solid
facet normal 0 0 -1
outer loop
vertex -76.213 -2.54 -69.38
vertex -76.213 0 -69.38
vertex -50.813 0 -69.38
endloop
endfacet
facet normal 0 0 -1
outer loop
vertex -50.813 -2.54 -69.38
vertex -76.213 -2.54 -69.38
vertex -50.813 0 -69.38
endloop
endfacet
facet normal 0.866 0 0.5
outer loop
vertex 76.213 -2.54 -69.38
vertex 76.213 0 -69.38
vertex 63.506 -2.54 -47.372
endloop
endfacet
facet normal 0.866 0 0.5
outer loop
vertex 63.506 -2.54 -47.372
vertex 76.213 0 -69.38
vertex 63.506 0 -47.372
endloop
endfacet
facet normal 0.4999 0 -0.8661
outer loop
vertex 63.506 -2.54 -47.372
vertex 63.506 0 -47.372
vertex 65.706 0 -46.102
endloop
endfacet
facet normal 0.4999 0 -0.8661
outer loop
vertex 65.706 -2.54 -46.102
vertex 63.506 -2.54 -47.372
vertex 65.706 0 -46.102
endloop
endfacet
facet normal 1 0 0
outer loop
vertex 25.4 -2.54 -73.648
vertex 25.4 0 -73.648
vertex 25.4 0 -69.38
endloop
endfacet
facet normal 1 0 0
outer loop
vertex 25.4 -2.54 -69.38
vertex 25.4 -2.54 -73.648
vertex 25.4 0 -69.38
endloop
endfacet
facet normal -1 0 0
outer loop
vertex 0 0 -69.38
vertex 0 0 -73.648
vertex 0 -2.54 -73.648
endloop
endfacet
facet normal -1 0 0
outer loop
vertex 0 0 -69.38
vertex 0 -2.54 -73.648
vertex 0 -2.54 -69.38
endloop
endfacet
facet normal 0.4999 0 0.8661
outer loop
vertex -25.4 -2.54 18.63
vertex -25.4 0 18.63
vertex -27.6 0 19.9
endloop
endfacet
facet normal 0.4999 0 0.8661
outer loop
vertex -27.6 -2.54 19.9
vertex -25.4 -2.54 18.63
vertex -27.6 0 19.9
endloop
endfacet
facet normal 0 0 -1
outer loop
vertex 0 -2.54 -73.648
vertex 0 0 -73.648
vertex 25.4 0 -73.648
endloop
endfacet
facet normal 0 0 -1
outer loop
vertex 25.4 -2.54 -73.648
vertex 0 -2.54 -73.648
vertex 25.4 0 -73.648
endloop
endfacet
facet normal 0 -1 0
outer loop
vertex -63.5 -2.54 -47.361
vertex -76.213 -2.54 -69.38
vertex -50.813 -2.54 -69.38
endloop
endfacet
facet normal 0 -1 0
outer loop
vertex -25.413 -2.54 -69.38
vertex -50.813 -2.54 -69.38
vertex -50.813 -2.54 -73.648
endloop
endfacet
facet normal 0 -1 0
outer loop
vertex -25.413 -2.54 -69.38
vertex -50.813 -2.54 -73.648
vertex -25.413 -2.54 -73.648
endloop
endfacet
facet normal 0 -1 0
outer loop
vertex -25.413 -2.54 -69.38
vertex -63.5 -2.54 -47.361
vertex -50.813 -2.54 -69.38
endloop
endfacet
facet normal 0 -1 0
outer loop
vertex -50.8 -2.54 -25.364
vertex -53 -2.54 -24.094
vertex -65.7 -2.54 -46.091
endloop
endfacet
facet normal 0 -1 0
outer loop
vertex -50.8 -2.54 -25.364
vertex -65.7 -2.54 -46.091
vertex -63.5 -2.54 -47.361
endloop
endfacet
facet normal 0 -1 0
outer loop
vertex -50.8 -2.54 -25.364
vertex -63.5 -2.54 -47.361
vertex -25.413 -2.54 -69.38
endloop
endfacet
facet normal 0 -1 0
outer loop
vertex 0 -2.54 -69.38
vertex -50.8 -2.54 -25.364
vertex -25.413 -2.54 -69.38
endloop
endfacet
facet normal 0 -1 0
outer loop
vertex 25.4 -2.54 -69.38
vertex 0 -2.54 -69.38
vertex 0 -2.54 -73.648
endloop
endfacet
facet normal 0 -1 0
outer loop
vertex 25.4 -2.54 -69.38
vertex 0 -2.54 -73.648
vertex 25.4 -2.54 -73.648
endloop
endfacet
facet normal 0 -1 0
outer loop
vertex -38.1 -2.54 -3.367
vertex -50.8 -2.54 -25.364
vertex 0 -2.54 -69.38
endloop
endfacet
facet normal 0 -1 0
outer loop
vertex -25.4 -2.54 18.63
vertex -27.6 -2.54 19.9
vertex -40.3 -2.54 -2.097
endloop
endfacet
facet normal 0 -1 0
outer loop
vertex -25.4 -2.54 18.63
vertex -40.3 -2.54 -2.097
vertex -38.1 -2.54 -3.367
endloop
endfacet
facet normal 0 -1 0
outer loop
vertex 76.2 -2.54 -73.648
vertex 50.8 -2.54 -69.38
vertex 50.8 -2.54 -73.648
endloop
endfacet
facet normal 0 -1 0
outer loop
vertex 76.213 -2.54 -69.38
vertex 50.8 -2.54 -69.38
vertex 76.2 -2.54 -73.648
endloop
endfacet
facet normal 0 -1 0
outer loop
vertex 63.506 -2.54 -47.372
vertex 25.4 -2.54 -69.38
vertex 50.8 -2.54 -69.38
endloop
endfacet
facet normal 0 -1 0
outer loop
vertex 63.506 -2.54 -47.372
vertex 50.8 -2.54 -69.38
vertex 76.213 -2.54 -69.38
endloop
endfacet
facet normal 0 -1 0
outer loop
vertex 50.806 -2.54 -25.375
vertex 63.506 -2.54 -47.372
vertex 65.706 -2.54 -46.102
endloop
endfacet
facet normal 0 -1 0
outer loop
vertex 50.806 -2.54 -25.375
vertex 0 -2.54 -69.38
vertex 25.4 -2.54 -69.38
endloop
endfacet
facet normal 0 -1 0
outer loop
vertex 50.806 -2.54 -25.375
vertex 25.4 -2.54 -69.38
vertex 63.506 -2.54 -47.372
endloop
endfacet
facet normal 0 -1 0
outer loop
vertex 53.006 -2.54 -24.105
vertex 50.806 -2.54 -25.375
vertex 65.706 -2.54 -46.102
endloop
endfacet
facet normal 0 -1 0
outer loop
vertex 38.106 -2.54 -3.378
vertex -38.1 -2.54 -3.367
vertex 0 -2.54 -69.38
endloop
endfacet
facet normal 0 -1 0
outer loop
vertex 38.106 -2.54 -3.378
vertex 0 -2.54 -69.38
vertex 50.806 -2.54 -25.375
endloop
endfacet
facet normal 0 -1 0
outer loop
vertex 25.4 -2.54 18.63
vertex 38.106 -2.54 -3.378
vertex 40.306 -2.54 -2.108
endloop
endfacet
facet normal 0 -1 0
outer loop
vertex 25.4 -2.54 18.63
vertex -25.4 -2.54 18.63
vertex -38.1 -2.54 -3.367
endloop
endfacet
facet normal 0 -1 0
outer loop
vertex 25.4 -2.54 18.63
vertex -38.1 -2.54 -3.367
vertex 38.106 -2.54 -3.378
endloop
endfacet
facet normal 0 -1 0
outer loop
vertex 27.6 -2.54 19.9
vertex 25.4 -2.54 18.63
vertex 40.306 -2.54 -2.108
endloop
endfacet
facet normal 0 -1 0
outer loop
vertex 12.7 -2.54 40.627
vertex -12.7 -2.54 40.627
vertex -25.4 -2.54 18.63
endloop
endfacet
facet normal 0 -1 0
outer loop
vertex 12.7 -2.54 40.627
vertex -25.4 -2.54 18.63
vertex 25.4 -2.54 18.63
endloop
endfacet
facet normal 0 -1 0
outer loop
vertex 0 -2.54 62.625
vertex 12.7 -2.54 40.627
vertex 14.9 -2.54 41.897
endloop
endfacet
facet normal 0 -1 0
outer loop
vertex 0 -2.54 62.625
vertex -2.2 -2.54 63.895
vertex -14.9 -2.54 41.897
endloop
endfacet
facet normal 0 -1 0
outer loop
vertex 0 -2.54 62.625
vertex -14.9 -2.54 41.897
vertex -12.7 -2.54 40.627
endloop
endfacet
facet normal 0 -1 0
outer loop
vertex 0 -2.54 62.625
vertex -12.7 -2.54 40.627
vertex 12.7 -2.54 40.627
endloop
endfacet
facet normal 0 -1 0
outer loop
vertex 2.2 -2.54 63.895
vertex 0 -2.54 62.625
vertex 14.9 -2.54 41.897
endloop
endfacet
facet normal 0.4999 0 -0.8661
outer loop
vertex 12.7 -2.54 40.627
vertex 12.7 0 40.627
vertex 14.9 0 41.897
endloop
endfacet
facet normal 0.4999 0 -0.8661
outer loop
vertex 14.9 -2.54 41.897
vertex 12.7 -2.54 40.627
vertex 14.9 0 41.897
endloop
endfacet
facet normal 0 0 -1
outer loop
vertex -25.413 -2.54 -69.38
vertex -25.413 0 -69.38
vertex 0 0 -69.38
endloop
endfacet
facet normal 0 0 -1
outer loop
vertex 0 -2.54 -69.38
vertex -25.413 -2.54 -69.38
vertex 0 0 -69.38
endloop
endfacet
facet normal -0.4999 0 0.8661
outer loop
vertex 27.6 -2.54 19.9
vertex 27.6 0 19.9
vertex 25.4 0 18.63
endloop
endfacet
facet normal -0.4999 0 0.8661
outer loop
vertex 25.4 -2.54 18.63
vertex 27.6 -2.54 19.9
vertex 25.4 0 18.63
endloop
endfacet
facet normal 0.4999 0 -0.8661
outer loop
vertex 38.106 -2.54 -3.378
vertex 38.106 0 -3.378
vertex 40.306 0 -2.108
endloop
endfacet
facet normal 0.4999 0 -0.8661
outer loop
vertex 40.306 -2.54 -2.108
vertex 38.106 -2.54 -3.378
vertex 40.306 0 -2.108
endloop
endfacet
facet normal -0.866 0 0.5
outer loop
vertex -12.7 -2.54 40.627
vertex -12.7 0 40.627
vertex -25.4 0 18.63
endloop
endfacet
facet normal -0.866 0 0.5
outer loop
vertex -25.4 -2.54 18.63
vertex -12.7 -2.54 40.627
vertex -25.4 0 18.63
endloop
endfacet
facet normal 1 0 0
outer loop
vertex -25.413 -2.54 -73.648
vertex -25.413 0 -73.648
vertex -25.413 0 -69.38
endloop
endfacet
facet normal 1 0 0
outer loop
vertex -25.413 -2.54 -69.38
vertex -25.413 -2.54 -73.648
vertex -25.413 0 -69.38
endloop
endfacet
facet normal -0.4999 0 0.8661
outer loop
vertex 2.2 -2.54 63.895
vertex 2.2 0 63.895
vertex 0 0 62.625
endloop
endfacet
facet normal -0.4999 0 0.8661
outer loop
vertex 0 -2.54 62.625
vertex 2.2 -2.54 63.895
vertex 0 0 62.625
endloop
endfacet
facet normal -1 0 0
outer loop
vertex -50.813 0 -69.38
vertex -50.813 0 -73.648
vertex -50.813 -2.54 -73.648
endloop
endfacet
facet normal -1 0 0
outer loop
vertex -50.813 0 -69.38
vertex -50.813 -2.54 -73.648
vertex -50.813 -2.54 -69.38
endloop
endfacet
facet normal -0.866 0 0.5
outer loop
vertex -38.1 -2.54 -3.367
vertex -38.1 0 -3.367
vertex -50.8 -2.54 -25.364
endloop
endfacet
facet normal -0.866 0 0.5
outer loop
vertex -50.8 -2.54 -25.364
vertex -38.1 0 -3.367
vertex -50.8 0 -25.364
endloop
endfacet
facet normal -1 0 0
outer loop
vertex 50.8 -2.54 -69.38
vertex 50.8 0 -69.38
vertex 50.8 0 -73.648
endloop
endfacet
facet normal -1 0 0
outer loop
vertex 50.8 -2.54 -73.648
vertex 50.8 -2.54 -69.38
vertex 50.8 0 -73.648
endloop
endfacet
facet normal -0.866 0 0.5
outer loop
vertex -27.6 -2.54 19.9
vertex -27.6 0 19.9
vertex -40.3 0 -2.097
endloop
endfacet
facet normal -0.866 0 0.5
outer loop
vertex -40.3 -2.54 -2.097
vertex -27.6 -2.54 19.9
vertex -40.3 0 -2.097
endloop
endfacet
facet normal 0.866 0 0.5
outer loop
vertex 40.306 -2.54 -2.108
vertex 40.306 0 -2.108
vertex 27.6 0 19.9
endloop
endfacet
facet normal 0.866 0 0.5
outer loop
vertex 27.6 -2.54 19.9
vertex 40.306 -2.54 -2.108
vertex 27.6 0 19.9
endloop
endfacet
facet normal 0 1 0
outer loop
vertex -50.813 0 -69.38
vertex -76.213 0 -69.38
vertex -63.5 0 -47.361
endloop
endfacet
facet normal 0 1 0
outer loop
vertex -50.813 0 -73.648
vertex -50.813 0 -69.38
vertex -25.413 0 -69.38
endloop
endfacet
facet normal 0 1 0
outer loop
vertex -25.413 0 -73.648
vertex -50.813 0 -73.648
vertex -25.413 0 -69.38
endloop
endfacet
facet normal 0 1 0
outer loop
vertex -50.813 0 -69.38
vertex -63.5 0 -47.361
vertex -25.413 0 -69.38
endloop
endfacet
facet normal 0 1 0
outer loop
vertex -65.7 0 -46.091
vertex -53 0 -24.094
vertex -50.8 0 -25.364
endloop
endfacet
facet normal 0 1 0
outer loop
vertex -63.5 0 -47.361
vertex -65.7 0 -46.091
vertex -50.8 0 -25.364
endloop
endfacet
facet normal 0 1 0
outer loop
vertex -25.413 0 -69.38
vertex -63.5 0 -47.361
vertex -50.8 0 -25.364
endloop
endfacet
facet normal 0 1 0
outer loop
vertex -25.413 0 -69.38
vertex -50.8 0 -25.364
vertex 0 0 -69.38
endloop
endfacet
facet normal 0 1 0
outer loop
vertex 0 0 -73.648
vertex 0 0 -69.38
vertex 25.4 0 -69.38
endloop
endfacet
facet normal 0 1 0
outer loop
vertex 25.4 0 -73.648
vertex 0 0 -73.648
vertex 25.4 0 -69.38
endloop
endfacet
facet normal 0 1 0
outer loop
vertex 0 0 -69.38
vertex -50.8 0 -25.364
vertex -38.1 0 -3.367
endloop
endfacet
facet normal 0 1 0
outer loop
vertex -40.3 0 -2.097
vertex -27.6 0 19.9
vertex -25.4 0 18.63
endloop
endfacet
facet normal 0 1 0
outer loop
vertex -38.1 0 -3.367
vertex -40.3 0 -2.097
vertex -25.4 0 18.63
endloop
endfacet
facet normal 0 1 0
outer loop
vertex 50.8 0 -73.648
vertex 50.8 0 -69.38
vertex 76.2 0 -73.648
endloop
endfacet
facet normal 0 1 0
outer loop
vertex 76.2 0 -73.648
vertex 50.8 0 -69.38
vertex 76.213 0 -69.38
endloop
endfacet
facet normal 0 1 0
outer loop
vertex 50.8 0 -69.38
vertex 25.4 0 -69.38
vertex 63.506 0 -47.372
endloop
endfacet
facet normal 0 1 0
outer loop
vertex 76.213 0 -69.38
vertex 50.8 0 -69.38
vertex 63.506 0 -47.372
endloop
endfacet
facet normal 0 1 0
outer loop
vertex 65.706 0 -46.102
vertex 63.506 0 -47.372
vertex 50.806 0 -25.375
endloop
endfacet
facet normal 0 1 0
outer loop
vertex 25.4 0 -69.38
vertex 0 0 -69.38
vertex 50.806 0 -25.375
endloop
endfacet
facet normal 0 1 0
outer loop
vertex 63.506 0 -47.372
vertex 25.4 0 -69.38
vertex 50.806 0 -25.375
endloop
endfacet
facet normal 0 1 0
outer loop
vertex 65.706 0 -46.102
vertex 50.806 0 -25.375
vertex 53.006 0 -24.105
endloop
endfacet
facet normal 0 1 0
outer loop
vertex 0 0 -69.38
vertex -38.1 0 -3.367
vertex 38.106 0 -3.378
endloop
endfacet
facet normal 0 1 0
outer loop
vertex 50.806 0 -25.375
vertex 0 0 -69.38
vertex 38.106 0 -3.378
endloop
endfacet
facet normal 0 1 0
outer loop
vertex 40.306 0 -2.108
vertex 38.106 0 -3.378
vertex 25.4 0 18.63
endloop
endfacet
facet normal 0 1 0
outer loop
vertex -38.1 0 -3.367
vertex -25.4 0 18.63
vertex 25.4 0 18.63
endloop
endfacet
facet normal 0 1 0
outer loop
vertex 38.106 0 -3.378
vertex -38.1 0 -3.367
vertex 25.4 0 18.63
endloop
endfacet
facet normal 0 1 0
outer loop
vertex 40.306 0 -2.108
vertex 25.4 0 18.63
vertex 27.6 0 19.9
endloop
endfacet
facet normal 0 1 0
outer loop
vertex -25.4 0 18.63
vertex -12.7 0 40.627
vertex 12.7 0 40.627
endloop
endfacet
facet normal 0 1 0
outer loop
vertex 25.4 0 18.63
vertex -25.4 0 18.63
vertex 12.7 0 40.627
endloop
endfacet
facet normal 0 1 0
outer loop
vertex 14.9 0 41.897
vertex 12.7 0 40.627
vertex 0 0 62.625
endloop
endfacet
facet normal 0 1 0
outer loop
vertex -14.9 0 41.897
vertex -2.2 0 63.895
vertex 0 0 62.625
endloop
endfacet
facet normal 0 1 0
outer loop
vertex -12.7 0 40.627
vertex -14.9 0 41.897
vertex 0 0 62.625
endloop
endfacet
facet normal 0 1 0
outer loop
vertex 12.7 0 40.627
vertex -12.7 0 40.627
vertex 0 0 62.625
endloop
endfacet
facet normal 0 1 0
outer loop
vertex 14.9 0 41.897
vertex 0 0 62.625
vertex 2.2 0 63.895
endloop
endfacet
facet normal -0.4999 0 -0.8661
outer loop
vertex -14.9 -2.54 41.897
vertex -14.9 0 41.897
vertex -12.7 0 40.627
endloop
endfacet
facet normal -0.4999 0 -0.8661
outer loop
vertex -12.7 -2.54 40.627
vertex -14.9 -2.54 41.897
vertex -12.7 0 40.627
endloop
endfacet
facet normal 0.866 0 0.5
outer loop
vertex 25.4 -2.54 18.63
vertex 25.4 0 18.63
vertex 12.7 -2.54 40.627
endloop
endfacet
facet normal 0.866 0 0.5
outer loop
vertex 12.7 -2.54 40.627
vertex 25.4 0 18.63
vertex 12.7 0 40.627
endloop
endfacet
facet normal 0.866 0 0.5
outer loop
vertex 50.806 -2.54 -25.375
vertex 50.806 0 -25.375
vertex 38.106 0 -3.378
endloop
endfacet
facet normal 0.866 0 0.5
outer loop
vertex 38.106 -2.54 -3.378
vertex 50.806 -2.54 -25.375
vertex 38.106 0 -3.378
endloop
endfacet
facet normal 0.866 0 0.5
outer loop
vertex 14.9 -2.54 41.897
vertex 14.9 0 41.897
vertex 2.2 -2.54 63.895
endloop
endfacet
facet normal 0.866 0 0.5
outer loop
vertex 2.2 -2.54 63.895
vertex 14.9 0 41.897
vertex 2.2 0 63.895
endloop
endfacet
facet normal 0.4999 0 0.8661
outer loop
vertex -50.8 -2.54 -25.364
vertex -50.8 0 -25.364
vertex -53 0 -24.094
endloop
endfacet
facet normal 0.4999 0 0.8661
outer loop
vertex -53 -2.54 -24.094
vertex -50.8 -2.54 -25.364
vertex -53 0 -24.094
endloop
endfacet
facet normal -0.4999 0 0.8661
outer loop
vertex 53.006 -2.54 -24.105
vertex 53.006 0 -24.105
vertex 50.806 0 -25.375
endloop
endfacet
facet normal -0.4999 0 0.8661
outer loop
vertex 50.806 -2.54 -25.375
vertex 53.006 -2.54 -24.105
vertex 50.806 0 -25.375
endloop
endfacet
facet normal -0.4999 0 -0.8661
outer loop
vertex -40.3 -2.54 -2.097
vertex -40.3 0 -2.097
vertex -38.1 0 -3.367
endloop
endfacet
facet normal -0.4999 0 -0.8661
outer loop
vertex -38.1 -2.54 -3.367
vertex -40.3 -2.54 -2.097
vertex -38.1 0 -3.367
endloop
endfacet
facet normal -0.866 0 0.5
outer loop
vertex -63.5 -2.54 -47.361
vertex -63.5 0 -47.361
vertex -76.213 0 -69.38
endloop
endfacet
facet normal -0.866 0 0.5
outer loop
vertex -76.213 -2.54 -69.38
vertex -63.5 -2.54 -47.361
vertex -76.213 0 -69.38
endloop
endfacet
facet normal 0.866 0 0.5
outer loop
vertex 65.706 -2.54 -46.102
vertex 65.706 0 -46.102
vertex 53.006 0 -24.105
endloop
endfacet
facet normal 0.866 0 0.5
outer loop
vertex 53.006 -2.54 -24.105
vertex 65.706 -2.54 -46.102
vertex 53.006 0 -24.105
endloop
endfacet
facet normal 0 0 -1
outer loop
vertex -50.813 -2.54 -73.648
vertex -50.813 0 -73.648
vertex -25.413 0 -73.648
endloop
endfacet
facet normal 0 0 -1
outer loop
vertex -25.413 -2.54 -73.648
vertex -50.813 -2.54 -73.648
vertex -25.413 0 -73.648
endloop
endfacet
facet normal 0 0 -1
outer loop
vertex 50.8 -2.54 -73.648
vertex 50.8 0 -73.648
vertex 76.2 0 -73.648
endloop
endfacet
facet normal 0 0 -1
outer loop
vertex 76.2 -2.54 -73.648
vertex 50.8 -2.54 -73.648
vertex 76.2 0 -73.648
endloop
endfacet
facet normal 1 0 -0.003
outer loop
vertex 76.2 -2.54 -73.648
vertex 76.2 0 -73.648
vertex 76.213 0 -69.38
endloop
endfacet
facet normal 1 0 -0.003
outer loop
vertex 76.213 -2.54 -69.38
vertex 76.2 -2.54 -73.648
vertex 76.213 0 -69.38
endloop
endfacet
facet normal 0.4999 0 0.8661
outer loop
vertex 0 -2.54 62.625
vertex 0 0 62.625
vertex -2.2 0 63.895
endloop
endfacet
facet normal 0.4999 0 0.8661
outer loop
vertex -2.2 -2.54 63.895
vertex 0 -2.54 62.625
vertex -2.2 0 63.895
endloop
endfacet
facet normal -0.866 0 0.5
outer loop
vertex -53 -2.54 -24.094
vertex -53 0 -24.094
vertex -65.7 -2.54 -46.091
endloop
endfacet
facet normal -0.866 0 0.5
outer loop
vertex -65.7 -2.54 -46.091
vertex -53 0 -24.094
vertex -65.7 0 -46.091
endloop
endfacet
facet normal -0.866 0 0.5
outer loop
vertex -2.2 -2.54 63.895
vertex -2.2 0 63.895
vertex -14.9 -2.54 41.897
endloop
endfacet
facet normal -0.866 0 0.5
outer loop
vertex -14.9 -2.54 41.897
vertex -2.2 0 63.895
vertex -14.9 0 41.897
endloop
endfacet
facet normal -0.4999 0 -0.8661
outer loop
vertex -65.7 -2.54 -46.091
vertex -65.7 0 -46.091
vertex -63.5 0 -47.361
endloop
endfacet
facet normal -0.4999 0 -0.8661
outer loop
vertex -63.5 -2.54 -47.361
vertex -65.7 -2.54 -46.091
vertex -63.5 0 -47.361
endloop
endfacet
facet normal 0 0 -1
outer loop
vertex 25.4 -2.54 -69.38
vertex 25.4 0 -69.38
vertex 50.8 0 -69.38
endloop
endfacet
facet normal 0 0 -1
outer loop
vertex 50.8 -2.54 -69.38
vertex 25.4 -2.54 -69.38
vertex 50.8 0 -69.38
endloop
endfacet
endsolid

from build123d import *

# Parameters (mm, degrees)
F0_W     = 25.4
F0_H     = 4.2683564431
F1_DEPTH = 2.54


with BuildPart() as f1:
    # F0 (on Front) → F1 (new body)
    with BuildSketch(Plane.XZ):
        Polygon((12.7, 40.6274771875), (0, 62.6245224436), (-12.7, 40.6274771875), (-25.4, 18.6304319314), (-38.1, -3.3666133248), (-50.8, -25.3636585809), (-63.5, -47.360703837), (-76.2127, -69.3797461384), (-50.8127, -69.3797461384), (-25.4127, -69.3797461384), (0, -69.3797461384), (25.4, -69.3797461384), (50.8, -69.3797461384), (76.2127, -69.3797461384), (63.50635, -47.3717023596), (50.80635, -25.3746571035), (38.10635, -3.3776118474), (25.4, 18.6304319314), align=None)
        Polygon((2.1997045256, 63.8945224436), (0, 62.6245224436), (12.7, 40.6274771875), (14.8997045256, 41.8974771875), align=None)
        Polygon((-12.7, 40.6274771875), (0, 62.6245224436), (-2.1997045256, 63.8945224436), (-14.8997045256, 41.8974771875), align=None)
        Polygon((-38.1, -3.3666133248), (-25.4, 18.6304319314), (-27.5997045256, 19.9004319314), (-40.2997045256, -2.0966133248), align=None)
        Polygon((27.5997045256, 19.9004319314), (25.4, 18.6304319314), (38.10635, -3.3776118474), (40.3060545256, -2.1076118474), align=None)
        Polygon((-63.5, -47.360703837), (-50.8, -25.3636585809), (-52.9997045256, -24.0936585809), (-65.6997045256, -46.090703837), align=None)
        Polygon((53.0060545256, -24.1046571035), (50.80635, -25.3746571035), (63.50635, -47.3717023596), (65.7060545256, -46.1017023596), align=None)
        Polygon((76.2, -73.6481025815), (76.2127, -69.3797461384), (50.8, -69.3797461384), (50.8, -73.6481025815), align=None)
        with Locations((-38.1127, -71.5139243599)):
            Rectangle(F0_W, F0_H)
        with Locations((12.7, -71.5139243599)):
            Rectangle(F0_W, F0_H)
    extrude(amount=F1_DEPTH)


solid = f1.part
